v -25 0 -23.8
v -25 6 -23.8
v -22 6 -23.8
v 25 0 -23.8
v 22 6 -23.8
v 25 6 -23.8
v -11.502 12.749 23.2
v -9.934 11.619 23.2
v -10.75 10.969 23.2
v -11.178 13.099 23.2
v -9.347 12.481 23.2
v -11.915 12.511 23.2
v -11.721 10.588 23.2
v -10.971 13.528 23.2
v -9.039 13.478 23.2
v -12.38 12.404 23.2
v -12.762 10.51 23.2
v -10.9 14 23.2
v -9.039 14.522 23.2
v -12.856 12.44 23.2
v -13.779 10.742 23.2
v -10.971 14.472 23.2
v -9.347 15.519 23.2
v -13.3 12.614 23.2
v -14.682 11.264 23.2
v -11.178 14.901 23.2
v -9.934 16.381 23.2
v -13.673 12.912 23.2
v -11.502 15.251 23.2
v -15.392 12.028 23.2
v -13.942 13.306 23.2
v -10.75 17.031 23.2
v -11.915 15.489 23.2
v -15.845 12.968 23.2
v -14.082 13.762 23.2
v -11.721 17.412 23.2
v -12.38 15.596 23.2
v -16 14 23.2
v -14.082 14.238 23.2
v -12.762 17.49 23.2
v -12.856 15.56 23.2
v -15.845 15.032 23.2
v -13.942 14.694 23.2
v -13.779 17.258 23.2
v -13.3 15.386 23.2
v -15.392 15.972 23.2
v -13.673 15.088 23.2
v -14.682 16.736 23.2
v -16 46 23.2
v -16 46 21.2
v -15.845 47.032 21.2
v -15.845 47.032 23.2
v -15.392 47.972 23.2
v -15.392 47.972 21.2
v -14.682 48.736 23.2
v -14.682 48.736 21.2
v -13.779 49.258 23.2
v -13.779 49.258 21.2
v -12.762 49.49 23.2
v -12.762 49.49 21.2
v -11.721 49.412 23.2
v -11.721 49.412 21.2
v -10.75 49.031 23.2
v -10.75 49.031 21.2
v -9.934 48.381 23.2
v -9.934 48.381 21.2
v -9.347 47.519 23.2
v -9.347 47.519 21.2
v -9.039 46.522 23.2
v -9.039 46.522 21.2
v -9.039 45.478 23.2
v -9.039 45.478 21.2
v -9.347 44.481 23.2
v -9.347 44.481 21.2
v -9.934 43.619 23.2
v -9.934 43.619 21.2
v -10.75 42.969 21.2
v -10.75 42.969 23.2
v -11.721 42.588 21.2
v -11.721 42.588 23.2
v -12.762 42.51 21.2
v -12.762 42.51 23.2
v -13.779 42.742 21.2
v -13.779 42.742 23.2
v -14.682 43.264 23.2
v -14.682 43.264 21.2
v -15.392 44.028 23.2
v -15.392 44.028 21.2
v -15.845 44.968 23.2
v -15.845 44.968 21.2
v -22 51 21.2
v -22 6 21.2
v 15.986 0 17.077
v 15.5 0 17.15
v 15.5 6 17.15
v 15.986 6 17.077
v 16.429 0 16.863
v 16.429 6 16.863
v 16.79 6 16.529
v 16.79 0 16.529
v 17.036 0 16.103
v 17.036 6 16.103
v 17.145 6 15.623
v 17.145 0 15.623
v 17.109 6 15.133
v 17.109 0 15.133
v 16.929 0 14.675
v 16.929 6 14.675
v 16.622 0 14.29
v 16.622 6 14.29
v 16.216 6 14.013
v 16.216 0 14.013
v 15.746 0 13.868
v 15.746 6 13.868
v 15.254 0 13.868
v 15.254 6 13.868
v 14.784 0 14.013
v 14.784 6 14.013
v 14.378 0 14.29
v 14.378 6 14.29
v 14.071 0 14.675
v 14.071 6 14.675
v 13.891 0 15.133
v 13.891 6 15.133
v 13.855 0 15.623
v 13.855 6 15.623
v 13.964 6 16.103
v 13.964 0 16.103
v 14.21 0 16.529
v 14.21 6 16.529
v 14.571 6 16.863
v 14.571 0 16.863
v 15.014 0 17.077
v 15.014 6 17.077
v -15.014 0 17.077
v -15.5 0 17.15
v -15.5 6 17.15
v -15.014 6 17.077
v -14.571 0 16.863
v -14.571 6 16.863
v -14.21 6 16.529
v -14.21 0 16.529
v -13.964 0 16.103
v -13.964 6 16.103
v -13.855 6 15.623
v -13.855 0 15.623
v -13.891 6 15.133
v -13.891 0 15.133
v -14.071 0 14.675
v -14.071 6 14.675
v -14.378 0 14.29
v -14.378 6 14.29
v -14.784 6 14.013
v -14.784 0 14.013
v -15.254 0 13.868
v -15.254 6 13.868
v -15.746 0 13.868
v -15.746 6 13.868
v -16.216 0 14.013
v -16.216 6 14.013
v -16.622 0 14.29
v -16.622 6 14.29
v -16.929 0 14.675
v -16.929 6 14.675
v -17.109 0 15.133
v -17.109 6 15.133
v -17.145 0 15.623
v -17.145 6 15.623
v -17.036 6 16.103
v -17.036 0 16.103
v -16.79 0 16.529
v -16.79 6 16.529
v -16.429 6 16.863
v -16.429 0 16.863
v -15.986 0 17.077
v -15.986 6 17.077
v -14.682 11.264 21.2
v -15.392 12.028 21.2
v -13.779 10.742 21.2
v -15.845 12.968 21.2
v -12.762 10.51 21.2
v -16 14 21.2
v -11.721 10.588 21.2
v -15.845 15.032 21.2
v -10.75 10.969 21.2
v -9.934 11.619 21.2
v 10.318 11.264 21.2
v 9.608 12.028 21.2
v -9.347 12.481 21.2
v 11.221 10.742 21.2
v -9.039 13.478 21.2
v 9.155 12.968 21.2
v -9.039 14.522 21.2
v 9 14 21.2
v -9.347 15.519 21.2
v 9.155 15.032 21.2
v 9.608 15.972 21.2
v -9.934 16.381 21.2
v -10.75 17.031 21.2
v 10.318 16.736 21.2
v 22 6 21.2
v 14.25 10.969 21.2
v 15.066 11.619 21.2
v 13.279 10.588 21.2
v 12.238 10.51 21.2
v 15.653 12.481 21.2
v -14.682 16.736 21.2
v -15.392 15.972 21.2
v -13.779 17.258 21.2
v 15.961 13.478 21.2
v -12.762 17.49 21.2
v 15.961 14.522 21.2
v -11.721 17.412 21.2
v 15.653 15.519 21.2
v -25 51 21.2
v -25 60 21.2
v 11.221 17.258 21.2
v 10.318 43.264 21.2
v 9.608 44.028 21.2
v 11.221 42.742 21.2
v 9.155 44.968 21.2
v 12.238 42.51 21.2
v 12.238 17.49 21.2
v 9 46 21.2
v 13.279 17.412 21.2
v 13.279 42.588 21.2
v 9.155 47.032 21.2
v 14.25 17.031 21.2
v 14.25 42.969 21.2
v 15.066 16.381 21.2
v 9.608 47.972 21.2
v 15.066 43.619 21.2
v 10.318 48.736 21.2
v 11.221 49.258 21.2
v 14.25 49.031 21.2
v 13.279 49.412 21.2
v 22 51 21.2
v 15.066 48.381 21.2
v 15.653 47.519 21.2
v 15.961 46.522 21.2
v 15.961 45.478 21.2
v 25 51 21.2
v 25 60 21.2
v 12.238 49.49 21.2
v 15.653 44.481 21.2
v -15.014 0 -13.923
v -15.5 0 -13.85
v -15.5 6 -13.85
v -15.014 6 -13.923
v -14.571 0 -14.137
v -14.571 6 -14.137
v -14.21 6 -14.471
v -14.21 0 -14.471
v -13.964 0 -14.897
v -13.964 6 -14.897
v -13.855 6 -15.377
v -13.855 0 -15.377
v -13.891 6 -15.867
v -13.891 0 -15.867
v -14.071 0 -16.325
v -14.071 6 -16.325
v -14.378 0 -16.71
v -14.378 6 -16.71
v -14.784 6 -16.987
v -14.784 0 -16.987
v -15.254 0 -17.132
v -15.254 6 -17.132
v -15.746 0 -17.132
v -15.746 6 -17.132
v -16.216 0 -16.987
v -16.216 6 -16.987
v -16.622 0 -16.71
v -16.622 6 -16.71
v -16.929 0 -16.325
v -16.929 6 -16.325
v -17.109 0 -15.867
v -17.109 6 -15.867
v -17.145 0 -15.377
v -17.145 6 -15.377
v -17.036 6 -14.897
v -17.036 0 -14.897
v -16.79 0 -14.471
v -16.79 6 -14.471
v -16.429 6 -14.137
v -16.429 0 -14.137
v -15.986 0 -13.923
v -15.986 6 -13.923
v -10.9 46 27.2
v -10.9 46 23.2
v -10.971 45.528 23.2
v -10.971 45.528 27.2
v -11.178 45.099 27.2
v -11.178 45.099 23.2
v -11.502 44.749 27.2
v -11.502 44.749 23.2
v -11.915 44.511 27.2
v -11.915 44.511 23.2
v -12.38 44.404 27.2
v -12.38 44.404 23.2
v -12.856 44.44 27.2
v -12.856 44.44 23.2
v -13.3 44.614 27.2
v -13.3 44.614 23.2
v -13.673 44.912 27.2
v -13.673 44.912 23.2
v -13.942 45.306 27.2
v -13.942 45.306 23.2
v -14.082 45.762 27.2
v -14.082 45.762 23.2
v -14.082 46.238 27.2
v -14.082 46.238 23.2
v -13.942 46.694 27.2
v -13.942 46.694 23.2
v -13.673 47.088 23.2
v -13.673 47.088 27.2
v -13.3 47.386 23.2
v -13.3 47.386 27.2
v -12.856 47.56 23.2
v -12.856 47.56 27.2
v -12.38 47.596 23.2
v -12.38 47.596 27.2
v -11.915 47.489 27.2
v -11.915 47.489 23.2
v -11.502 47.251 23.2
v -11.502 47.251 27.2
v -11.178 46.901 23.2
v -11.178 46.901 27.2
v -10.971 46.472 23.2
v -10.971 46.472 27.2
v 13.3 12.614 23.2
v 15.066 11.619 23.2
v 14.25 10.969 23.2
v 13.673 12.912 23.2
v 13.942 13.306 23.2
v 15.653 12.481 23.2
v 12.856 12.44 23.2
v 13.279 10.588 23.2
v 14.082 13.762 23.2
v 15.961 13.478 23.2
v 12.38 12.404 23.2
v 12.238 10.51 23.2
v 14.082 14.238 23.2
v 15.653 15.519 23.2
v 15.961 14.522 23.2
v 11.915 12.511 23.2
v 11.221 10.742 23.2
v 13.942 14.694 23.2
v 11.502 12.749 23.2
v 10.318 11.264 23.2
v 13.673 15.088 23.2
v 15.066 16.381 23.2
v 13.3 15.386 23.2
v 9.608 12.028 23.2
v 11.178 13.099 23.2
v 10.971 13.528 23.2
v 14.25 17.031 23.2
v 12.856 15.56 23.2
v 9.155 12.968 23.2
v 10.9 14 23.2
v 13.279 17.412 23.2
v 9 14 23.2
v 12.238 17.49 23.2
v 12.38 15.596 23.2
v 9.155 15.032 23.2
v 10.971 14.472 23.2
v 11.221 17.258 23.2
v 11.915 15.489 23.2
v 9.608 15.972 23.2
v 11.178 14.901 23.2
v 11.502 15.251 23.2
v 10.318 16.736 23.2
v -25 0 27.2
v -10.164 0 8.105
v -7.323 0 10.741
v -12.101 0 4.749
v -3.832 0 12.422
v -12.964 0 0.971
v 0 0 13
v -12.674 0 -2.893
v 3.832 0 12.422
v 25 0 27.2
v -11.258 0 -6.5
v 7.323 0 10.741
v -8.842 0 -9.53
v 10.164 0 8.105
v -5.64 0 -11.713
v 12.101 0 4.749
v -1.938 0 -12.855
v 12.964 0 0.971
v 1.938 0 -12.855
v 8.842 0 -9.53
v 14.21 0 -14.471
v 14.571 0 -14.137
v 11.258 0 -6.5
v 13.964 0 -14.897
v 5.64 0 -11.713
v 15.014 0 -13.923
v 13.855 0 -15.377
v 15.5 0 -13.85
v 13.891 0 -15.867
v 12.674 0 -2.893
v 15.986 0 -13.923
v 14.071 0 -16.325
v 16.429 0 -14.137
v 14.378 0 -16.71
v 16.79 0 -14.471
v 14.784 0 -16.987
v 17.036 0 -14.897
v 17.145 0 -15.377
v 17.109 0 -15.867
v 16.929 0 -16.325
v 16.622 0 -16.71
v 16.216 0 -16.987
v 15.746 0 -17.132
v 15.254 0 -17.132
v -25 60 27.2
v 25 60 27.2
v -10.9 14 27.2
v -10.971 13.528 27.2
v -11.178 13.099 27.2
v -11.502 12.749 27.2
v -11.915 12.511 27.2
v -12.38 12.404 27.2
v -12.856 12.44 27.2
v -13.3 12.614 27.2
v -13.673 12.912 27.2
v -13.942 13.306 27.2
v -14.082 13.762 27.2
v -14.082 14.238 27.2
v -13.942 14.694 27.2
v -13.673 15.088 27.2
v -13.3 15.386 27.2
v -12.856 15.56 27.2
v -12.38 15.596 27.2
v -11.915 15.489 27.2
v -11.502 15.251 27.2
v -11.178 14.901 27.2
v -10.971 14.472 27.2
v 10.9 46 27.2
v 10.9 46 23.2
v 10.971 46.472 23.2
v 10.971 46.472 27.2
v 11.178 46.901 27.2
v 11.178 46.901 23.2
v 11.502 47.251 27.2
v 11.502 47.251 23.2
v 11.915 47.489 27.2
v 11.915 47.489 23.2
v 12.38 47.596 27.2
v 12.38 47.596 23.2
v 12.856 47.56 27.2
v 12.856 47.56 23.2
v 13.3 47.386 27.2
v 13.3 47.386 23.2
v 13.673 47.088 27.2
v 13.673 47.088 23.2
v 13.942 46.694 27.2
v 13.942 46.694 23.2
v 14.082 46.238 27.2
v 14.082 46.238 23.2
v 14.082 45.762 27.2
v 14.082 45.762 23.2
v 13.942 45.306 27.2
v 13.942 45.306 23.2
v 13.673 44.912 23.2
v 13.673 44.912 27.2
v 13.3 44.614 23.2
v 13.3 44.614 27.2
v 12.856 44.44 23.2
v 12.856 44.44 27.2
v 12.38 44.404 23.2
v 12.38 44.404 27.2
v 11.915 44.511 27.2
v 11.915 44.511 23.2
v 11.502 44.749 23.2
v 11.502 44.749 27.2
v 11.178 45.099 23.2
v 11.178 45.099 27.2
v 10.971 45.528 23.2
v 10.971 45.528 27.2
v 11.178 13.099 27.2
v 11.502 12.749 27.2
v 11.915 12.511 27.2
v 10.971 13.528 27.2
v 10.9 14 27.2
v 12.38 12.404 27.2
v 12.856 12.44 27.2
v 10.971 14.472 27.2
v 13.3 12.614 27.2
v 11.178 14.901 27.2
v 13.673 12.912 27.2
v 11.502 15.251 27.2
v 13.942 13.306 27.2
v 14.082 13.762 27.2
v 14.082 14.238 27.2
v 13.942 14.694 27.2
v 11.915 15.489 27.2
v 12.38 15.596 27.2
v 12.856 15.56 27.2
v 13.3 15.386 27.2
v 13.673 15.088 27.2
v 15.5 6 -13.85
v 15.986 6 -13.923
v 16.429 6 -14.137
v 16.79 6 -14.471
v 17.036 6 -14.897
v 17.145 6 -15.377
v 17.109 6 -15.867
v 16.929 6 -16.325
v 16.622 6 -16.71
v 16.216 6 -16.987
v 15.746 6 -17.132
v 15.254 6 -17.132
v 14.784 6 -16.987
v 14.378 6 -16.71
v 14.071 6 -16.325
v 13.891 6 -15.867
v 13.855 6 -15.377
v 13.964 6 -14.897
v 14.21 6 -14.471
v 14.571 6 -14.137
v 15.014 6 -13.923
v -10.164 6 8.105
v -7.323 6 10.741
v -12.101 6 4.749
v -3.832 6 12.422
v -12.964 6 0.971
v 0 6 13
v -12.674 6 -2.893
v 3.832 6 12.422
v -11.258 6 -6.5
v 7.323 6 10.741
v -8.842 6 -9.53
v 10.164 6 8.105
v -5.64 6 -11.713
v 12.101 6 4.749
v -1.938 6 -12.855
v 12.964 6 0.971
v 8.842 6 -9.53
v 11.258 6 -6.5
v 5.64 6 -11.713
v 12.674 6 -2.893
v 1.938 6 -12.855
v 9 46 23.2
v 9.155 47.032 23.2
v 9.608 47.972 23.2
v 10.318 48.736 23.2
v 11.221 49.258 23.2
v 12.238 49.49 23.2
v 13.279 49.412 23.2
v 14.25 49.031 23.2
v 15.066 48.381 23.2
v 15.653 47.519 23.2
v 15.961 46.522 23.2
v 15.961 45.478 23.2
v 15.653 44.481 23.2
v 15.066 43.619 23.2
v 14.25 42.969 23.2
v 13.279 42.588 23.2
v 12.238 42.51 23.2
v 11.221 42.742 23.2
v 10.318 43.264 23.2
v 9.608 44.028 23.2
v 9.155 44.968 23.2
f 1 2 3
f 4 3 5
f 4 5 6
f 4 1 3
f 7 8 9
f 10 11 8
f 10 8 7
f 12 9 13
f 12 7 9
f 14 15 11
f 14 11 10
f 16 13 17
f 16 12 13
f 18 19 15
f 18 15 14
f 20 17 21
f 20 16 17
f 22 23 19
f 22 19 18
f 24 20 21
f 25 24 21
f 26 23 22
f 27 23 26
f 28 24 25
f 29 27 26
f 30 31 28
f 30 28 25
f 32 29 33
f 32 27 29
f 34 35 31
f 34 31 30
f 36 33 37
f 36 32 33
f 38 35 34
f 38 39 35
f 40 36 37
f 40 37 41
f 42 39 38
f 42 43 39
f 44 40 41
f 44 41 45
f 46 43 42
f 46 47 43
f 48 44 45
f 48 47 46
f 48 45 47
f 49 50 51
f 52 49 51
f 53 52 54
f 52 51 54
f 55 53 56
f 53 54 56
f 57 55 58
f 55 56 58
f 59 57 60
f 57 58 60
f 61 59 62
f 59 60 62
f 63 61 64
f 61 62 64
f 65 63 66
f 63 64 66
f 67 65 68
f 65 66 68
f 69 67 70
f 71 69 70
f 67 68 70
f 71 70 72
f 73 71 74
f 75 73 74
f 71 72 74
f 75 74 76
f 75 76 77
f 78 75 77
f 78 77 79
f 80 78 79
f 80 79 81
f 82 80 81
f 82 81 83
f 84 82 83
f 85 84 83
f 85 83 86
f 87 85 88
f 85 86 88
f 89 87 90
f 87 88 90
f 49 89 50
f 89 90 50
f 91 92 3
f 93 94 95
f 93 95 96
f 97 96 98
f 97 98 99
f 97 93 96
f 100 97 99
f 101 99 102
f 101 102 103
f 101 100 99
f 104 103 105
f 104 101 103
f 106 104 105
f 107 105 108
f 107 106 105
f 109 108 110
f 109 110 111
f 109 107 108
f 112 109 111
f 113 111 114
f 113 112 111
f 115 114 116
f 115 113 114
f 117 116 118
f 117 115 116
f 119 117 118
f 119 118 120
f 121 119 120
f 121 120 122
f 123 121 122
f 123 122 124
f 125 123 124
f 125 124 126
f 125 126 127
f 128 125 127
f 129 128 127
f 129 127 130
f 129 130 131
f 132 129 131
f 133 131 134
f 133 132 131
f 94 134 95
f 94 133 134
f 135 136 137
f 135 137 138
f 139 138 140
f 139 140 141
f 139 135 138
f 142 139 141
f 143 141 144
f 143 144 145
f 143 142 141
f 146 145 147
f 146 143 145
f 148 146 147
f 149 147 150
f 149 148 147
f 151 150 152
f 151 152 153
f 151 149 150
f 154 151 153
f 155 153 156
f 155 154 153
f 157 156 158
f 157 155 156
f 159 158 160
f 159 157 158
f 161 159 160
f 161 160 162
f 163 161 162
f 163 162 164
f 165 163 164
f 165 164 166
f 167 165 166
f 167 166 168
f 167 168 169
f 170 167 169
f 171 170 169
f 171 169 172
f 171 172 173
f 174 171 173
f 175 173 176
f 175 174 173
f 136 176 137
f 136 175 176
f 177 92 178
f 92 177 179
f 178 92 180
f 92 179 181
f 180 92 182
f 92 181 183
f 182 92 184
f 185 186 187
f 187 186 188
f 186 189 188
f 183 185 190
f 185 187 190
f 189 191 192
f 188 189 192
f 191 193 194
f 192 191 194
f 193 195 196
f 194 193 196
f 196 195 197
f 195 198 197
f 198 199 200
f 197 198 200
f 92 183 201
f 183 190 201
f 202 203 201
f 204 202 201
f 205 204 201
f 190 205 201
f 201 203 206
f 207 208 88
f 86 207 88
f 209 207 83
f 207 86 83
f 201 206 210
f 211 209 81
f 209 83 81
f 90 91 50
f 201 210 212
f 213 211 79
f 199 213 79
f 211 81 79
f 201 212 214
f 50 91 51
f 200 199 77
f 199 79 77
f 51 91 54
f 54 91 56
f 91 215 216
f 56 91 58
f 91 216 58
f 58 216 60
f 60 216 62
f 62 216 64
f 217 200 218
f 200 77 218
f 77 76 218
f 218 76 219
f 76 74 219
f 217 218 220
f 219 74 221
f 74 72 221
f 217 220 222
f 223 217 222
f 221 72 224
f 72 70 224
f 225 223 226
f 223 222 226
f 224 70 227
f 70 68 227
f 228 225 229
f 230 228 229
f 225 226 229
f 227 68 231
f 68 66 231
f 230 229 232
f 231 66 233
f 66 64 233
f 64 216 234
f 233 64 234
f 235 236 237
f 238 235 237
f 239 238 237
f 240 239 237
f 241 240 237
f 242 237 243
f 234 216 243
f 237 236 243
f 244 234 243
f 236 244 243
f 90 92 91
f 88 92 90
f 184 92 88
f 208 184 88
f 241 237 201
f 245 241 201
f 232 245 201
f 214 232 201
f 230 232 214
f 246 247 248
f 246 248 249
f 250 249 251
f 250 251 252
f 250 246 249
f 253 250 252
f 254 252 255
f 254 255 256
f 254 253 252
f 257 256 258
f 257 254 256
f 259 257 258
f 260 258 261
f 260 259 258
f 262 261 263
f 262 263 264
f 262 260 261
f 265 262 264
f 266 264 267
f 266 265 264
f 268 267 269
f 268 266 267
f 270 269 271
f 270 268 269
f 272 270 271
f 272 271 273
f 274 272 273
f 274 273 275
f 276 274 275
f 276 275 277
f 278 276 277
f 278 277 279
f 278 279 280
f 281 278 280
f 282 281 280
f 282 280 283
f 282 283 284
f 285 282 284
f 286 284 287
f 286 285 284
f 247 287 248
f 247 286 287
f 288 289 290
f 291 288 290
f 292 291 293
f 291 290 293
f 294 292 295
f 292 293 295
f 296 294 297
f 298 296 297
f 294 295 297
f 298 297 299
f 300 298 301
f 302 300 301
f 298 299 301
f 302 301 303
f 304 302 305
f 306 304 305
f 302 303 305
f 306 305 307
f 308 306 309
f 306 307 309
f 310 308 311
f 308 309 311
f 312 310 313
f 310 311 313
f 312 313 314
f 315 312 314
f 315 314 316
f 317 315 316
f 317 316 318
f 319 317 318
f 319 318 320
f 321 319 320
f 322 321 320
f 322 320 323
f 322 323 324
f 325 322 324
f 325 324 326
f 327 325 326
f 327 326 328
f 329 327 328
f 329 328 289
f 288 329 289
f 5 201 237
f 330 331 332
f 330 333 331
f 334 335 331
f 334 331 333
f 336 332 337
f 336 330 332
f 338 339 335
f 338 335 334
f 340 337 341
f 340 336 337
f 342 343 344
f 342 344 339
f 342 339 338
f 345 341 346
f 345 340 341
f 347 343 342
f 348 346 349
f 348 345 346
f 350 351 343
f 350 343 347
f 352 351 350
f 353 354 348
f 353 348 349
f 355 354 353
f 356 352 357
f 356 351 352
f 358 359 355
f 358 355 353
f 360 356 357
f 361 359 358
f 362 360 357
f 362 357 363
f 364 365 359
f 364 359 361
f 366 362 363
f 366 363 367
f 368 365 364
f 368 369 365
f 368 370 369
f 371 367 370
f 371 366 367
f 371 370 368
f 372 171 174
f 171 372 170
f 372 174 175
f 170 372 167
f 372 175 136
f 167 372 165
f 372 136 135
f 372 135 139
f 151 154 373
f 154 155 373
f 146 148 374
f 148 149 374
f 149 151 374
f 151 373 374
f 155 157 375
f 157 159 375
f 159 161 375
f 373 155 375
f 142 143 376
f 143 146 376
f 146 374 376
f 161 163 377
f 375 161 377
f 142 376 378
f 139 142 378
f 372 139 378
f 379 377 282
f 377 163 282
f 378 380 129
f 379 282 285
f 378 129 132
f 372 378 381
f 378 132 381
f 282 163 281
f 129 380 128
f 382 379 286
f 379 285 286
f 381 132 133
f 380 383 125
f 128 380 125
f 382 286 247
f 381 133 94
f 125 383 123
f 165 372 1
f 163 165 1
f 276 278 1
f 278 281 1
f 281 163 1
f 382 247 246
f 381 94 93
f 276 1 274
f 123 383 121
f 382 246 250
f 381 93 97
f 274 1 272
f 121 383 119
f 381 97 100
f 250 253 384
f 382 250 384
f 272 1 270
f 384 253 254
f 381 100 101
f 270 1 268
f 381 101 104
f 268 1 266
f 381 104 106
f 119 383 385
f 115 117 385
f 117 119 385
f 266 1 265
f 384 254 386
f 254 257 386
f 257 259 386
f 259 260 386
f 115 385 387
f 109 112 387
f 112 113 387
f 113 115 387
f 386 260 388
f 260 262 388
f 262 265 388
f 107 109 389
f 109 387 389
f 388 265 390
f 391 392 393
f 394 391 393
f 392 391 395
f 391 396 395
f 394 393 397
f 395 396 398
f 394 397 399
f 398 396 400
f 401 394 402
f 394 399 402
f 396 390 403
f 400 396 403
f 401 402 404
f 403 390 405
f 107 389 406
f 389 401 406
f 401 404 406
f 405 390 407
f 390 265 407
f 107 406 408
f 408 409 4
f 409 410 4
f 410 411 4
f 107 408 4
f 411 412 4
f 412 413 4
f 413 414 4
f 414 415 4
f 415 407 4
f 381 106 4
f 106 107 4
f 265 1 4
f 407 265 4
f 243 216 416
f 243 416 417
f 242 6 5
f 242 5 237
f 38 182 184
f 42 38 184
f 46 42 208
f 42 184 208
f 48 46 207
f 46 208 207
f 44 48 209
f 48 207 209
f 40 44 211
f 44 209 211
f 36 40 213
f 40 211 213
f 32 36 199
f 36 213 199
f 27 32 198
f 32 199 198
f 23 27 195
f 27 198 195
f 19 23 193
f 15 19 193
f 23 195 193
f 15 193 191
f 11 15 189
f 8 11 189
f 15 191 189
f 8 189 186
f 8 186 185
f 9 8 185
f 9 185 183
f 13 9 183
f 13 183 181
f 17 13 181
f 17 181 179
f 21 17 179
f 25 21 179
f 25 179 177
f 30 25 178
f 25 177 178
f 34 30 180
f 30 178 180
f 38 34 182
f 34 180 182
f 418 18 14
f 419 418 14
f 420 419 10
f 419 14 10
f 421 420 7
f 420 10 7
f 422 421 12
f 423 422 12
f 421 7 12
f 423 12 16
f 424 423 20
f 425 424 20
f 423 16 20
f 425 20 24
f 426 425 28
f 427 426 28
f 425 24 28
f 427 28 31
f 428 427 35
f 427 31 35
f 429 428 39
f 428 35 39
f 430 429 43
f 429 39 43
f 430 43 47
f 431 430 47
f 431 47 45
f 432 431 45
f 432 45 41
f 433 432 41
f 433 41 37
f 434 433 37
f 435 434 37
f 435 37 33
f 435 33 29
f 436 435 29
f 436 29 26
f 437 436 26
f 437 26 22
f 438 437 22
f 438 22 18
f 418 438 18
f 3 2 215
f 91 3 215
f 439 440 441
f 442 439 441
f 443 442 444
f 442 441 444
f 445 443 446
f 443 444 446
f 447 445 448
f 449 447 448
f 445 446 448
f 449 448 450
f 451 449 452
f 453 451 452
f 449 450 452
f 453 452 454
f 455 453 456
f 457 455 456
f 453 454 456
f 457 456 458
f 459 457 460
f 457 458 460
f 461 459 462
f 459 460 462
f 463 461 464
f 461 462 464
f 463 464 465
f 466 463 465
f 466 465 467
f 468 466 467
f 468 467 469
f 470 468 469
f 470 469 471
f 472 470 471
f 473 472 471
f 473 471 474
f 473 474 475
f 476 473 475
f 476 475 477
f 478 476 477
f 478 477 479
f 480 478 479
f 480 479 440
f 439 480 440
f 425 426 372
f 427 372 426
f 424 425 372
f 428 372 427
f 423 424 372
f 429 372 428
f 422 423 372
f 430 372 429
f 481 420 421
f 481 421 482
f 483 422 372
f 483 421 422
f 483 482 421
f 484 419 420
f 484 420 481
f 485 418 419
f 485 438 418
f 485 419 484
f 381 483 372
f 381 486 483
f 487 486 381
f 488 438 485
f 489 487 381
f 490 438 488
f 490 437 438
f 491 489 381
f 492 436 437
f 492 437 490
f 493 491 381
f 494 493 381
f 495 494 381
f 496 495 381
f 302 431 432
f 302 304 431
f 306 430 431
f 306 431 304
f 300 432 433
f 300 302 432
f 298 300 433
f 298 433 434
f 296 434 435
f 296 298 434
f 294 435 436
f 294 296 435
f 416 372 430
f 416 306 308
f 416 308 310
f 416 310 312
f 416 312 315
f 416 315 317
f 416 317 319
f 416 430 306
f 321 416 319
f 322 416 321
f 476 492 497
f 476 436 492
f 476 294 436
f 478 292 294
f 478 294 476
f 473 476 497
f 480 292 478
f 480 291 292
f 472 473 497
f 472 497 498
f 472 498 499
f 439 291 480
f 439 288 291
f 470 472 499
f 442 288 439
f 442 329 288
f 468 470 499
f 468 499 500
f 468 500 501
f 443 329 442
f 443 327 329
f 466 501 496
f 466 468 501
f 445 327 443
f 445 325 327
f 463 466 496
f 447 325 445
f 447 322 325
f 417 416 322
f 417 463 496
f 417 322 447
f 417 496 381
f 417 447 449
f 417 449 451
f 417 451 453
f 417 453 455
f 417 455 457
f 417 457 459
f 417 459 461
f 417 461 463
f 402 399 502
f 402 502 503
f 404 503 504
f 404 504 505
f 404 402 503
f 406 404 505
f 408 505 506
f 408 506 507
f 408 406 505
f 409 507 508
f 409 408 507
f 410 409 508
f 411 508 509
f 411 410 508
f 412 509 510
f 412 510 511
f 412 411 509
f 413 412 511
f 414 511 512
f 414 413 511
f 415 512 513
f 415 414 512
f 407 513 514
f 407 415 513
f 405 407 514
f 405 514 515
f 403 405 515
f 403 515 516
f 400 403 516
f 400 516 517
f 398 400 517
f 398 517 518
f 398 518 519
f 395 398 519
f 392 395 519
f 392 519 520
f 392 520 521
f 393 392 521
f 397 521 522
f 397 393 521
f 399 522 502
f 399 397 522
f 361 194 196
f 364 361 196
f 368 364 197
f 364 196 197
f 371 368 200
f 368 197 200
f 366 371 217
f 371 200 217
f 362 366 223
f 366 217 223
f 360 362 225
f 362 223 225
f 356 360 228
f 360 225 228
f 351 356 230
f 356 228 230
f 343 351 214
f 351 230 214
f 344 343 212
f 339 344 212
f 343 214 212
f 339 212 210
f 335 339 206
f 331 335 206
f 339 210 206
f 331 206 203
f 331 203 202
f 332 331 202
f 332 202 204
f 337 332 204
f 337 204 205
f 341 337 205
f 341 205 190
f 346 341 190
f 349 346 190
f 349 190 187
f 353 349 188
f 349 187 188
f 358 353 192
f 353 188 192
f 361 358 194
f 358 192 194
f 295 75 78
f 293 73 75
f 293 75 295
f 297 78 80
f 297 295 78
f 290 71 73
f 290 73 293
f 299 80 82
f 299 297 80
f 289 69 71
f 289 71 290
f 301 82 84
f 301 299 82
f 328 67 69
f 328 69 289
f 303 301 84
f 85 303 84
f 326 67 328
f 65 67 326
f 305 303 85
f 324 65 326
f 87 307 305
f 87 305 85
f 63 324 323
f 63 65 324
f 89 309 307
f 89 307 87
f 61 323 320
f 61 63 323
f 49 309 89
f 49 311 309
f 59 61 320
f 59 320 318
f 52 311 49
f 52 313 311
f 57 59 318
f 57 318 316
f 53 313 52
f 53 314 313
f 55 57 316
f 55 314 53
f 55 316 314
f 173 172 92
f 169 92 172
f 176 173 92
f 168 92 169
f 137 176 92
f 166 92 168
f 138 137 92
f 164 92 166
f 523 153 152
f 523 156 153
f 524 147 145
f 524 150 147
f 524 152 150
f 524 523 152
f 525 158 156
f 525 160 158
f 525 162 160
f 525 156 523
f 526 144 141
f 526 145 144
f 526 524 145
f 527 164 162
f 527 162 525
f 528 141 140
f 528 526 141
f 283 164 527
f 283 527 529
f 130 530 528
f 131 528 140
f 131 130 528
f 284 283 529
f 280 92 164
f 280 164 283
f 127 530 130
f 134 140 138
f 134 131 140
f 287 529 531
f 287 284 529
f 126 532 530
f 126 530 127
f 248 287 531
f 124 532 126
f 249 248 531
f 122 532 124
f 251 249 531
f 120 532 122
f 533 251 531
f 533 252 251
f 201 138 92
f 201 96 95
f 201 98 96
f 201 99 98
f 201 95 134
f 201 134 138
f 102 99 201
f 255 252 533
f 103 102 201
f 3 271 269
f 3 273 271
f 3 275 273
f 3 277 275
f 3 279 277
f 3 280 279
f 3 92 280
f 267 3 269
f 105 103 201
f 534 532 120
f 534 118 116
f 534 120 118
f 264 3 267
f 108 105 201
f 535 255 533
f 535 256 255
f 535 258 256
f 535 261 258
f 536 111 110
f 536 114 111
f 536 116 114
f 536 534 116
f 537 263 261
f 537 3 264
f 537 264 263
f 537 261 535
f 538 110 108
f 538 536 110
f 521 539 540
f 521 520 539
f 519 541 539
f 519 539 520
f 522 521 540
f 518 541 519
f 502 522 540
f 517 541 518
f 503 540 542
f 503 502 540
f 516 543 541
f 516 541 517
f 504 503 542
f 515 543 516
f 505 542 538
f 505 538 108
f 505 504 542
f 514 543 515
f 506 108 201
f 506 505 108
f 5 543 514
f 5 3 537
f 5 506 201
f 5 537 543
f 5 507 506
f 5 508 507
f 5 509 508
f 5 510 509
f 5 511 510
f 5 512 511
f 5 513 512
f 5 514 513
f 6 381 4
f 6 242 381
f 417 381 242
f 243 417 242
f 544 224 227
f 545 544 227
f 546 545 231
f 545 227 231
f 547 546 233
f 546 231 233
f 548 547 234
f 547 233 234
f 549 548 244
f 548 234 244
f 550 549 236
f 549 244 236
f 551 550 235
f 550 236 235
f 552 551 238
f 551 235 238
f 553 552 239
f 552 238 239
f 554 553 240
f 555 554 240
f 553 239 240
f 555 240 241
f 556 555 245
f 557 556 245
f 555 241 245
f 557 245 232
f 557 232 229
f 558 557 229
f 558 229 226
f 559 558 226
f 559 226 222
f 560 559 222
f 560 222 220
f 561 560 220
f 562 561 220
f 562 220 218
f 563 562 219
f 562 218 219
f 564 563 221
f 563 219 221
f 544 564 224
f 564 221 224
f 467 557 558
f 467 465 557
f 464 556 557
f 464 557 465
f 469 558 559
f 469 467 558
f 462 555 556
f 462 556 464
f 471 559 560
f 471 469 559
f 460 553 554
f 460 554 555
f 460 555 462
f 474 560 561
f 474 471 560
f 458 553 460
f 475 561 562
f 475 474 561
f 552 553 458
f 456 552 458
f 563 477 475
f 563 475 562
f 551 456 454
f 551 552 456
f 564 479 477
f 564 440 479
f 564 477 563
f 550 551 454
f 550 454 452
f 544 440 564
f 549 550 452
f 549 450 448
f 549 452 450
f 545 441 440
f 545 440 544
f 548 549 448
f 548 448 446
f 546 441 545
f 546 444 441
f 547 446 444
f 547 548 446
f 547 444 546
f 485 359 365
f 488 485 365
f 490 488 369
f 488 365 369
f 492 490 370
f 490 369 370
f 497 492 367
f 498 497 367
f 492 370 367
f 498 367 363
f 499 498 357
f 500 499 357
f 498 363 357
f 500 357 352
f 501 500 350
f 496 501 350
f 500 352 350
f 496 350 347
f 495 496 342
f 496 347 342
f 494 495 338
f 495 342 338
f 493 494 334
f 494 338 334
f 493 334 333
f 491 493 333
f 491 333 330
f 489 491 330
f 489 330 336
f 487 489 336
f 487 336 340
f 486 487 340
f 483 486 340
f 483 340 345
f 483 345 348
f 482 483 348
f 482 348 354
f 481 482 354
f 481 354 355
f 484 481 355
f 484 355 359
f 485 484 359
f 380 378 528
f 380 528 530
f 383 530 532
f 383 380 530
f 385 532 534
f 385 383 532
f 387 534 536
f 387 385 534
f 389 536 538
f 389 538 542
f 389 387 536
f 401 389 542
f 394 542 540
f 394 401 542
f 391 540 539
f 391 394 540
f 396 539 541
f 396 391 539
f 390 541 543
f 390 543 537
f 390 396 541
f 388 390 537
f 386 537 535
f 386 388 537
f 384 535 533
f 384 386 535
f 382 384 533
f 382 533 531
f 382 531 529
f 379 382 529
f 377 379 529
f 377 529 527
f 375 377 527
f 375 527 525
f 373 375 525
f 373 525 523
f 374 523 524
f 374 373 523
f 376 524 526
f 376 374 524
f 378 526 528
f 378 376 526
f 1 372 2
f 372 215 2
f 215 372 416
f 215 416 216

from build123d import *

# Parameters (mm, degrees)
SKETCH_1_W          = 50
SKETCH_1_H          = 45
SKETCH_1_R          = 1.65
SKETCH_1_R_2        = 13
EXTRUDE_1_DEPTH     = 6
SKETCH_3_W          = 50
SKETCH_3_H          = 60
EXTRUDE_2_DEPTH     = 6
EXTRUDE_3_DEPTH     = 3
SKETCH_5_R          = 1.6
CUT_EXTRUDE_1_DEPTH = 80.056941504
SKETCH_6_R          = 3.5
CUT_EXTRUDE_2_DEPTH = 2


with BuildPart() as part:
    # 草图1 → 凸台-拉伸1 (new body)
    with BuildSketch(Plane(origin=(0, 0, 0), x_dir=(1, 0, 0), z_dir=(0, 1, 0))):
        with Locations((0, 1.3)):
            Rectangle(SKETCH_1_W, SKETCH_1_H)
        with Locations(Location((-15.5, 15.5, 0), (0, 0, 270))):
            Circle(SKETCH_1_R, mode=Mode.SUBTRACT)
        with Locations(Location((15.5, 15.5, 0), (0, 0, 270))):
            Circle(SKETCH_1_R, mode=Mode.SUBTRACT)
        with Locations(Location((15.5, -15.5, 0), (0, 0, 270))):
            Circle(SKETCH_1_R, mode=Mode.SUBTRACT)
        with Locations(Location((-15.5, -15.5, 0), (0, 0, 270))):
            Circle(SKETCH_1_R, mode=Mode.SUBTRACT)
        with Locations(Location((0, 0, 0), (0, 0, 270))):
            Circle(SKETCH_1_R_2, mode=Mode.SUBTRACT)
    extrude(amount=EXTRUDE_1_DEPTH)

    # 草图3 → 凸台-拉伸2 (add)
    with BuildSketch(Plane.XY.offset(21.2)):
        with Locations((0, 30)):
            Rectangle(SKETCH_3_W, SKETCH_3_H)
    extrude(amount=EXTRUDE_2_DEPTH)

    # 草图4 → 凸台-拉伸3 (add)
    with BuildSketch(Plane.ZY.offset(25)):
        Polygon((-23.8, 6), (21.2, 51), (21.2, 6), align=None)
    extrude_3 = extrude(amount=-EXTRUDE_3_DEPTH)

    # 镜向1: 凸台-拉伸3 across plane
    add(extrude_3.mirror(Plane(origin=(0, 0, 0), x_dir=(0, 0, 1), z_dir=(1, 0, 0))))

    # 草图5 → 切除-拉伸1 (cut, through all)
    with BuildSketch(Plane(origin=(0, 0, 21.2), x_dir=(-1, 0, 0), z_dir=(0, 0, -1))):
        with Locations((-12.5, 46)):
            Circle(SKETCH_5_R)
        with Locations((-12.5, 14)):
            Circle(SKETCH_5_R)
        with Locations(Location((12.5, 14, 0), (0, 0, 180))):
            Circle(SKETCH_5_R)
        with Locations(Location((12.5, 46, 0), (0, 0, 180))):
            Circle(SKETCH_5_R)
    extrude(amount=-CUT_EXTRUDE_1_DEPTH, mode=Mode.SUBTRACT)

    # 草图6 → 切除-拉伸2 (cut)
    with BuildSketch(Plane(origin=(0, 0, 21.2), x_dir=(-1, 0, 0), z_dir=(0, 0, -1))):
        with Locations((-12.5, 46)):
            Circle(SKETCH_6_R)
        with Locations((12.5, 46)):
            Circle(SKETCH_6_R)
        with Locations((-12.5, 14)):
            Circle(SKETCH_6_R)
        with Locations((12.5, 14)):
            Circle(SKETCH_6_R)
    extrude(amount=-CUT_EXTRUDE_2_DEPTH, mode=Mode.SUBTRACT)


solid = part.part
